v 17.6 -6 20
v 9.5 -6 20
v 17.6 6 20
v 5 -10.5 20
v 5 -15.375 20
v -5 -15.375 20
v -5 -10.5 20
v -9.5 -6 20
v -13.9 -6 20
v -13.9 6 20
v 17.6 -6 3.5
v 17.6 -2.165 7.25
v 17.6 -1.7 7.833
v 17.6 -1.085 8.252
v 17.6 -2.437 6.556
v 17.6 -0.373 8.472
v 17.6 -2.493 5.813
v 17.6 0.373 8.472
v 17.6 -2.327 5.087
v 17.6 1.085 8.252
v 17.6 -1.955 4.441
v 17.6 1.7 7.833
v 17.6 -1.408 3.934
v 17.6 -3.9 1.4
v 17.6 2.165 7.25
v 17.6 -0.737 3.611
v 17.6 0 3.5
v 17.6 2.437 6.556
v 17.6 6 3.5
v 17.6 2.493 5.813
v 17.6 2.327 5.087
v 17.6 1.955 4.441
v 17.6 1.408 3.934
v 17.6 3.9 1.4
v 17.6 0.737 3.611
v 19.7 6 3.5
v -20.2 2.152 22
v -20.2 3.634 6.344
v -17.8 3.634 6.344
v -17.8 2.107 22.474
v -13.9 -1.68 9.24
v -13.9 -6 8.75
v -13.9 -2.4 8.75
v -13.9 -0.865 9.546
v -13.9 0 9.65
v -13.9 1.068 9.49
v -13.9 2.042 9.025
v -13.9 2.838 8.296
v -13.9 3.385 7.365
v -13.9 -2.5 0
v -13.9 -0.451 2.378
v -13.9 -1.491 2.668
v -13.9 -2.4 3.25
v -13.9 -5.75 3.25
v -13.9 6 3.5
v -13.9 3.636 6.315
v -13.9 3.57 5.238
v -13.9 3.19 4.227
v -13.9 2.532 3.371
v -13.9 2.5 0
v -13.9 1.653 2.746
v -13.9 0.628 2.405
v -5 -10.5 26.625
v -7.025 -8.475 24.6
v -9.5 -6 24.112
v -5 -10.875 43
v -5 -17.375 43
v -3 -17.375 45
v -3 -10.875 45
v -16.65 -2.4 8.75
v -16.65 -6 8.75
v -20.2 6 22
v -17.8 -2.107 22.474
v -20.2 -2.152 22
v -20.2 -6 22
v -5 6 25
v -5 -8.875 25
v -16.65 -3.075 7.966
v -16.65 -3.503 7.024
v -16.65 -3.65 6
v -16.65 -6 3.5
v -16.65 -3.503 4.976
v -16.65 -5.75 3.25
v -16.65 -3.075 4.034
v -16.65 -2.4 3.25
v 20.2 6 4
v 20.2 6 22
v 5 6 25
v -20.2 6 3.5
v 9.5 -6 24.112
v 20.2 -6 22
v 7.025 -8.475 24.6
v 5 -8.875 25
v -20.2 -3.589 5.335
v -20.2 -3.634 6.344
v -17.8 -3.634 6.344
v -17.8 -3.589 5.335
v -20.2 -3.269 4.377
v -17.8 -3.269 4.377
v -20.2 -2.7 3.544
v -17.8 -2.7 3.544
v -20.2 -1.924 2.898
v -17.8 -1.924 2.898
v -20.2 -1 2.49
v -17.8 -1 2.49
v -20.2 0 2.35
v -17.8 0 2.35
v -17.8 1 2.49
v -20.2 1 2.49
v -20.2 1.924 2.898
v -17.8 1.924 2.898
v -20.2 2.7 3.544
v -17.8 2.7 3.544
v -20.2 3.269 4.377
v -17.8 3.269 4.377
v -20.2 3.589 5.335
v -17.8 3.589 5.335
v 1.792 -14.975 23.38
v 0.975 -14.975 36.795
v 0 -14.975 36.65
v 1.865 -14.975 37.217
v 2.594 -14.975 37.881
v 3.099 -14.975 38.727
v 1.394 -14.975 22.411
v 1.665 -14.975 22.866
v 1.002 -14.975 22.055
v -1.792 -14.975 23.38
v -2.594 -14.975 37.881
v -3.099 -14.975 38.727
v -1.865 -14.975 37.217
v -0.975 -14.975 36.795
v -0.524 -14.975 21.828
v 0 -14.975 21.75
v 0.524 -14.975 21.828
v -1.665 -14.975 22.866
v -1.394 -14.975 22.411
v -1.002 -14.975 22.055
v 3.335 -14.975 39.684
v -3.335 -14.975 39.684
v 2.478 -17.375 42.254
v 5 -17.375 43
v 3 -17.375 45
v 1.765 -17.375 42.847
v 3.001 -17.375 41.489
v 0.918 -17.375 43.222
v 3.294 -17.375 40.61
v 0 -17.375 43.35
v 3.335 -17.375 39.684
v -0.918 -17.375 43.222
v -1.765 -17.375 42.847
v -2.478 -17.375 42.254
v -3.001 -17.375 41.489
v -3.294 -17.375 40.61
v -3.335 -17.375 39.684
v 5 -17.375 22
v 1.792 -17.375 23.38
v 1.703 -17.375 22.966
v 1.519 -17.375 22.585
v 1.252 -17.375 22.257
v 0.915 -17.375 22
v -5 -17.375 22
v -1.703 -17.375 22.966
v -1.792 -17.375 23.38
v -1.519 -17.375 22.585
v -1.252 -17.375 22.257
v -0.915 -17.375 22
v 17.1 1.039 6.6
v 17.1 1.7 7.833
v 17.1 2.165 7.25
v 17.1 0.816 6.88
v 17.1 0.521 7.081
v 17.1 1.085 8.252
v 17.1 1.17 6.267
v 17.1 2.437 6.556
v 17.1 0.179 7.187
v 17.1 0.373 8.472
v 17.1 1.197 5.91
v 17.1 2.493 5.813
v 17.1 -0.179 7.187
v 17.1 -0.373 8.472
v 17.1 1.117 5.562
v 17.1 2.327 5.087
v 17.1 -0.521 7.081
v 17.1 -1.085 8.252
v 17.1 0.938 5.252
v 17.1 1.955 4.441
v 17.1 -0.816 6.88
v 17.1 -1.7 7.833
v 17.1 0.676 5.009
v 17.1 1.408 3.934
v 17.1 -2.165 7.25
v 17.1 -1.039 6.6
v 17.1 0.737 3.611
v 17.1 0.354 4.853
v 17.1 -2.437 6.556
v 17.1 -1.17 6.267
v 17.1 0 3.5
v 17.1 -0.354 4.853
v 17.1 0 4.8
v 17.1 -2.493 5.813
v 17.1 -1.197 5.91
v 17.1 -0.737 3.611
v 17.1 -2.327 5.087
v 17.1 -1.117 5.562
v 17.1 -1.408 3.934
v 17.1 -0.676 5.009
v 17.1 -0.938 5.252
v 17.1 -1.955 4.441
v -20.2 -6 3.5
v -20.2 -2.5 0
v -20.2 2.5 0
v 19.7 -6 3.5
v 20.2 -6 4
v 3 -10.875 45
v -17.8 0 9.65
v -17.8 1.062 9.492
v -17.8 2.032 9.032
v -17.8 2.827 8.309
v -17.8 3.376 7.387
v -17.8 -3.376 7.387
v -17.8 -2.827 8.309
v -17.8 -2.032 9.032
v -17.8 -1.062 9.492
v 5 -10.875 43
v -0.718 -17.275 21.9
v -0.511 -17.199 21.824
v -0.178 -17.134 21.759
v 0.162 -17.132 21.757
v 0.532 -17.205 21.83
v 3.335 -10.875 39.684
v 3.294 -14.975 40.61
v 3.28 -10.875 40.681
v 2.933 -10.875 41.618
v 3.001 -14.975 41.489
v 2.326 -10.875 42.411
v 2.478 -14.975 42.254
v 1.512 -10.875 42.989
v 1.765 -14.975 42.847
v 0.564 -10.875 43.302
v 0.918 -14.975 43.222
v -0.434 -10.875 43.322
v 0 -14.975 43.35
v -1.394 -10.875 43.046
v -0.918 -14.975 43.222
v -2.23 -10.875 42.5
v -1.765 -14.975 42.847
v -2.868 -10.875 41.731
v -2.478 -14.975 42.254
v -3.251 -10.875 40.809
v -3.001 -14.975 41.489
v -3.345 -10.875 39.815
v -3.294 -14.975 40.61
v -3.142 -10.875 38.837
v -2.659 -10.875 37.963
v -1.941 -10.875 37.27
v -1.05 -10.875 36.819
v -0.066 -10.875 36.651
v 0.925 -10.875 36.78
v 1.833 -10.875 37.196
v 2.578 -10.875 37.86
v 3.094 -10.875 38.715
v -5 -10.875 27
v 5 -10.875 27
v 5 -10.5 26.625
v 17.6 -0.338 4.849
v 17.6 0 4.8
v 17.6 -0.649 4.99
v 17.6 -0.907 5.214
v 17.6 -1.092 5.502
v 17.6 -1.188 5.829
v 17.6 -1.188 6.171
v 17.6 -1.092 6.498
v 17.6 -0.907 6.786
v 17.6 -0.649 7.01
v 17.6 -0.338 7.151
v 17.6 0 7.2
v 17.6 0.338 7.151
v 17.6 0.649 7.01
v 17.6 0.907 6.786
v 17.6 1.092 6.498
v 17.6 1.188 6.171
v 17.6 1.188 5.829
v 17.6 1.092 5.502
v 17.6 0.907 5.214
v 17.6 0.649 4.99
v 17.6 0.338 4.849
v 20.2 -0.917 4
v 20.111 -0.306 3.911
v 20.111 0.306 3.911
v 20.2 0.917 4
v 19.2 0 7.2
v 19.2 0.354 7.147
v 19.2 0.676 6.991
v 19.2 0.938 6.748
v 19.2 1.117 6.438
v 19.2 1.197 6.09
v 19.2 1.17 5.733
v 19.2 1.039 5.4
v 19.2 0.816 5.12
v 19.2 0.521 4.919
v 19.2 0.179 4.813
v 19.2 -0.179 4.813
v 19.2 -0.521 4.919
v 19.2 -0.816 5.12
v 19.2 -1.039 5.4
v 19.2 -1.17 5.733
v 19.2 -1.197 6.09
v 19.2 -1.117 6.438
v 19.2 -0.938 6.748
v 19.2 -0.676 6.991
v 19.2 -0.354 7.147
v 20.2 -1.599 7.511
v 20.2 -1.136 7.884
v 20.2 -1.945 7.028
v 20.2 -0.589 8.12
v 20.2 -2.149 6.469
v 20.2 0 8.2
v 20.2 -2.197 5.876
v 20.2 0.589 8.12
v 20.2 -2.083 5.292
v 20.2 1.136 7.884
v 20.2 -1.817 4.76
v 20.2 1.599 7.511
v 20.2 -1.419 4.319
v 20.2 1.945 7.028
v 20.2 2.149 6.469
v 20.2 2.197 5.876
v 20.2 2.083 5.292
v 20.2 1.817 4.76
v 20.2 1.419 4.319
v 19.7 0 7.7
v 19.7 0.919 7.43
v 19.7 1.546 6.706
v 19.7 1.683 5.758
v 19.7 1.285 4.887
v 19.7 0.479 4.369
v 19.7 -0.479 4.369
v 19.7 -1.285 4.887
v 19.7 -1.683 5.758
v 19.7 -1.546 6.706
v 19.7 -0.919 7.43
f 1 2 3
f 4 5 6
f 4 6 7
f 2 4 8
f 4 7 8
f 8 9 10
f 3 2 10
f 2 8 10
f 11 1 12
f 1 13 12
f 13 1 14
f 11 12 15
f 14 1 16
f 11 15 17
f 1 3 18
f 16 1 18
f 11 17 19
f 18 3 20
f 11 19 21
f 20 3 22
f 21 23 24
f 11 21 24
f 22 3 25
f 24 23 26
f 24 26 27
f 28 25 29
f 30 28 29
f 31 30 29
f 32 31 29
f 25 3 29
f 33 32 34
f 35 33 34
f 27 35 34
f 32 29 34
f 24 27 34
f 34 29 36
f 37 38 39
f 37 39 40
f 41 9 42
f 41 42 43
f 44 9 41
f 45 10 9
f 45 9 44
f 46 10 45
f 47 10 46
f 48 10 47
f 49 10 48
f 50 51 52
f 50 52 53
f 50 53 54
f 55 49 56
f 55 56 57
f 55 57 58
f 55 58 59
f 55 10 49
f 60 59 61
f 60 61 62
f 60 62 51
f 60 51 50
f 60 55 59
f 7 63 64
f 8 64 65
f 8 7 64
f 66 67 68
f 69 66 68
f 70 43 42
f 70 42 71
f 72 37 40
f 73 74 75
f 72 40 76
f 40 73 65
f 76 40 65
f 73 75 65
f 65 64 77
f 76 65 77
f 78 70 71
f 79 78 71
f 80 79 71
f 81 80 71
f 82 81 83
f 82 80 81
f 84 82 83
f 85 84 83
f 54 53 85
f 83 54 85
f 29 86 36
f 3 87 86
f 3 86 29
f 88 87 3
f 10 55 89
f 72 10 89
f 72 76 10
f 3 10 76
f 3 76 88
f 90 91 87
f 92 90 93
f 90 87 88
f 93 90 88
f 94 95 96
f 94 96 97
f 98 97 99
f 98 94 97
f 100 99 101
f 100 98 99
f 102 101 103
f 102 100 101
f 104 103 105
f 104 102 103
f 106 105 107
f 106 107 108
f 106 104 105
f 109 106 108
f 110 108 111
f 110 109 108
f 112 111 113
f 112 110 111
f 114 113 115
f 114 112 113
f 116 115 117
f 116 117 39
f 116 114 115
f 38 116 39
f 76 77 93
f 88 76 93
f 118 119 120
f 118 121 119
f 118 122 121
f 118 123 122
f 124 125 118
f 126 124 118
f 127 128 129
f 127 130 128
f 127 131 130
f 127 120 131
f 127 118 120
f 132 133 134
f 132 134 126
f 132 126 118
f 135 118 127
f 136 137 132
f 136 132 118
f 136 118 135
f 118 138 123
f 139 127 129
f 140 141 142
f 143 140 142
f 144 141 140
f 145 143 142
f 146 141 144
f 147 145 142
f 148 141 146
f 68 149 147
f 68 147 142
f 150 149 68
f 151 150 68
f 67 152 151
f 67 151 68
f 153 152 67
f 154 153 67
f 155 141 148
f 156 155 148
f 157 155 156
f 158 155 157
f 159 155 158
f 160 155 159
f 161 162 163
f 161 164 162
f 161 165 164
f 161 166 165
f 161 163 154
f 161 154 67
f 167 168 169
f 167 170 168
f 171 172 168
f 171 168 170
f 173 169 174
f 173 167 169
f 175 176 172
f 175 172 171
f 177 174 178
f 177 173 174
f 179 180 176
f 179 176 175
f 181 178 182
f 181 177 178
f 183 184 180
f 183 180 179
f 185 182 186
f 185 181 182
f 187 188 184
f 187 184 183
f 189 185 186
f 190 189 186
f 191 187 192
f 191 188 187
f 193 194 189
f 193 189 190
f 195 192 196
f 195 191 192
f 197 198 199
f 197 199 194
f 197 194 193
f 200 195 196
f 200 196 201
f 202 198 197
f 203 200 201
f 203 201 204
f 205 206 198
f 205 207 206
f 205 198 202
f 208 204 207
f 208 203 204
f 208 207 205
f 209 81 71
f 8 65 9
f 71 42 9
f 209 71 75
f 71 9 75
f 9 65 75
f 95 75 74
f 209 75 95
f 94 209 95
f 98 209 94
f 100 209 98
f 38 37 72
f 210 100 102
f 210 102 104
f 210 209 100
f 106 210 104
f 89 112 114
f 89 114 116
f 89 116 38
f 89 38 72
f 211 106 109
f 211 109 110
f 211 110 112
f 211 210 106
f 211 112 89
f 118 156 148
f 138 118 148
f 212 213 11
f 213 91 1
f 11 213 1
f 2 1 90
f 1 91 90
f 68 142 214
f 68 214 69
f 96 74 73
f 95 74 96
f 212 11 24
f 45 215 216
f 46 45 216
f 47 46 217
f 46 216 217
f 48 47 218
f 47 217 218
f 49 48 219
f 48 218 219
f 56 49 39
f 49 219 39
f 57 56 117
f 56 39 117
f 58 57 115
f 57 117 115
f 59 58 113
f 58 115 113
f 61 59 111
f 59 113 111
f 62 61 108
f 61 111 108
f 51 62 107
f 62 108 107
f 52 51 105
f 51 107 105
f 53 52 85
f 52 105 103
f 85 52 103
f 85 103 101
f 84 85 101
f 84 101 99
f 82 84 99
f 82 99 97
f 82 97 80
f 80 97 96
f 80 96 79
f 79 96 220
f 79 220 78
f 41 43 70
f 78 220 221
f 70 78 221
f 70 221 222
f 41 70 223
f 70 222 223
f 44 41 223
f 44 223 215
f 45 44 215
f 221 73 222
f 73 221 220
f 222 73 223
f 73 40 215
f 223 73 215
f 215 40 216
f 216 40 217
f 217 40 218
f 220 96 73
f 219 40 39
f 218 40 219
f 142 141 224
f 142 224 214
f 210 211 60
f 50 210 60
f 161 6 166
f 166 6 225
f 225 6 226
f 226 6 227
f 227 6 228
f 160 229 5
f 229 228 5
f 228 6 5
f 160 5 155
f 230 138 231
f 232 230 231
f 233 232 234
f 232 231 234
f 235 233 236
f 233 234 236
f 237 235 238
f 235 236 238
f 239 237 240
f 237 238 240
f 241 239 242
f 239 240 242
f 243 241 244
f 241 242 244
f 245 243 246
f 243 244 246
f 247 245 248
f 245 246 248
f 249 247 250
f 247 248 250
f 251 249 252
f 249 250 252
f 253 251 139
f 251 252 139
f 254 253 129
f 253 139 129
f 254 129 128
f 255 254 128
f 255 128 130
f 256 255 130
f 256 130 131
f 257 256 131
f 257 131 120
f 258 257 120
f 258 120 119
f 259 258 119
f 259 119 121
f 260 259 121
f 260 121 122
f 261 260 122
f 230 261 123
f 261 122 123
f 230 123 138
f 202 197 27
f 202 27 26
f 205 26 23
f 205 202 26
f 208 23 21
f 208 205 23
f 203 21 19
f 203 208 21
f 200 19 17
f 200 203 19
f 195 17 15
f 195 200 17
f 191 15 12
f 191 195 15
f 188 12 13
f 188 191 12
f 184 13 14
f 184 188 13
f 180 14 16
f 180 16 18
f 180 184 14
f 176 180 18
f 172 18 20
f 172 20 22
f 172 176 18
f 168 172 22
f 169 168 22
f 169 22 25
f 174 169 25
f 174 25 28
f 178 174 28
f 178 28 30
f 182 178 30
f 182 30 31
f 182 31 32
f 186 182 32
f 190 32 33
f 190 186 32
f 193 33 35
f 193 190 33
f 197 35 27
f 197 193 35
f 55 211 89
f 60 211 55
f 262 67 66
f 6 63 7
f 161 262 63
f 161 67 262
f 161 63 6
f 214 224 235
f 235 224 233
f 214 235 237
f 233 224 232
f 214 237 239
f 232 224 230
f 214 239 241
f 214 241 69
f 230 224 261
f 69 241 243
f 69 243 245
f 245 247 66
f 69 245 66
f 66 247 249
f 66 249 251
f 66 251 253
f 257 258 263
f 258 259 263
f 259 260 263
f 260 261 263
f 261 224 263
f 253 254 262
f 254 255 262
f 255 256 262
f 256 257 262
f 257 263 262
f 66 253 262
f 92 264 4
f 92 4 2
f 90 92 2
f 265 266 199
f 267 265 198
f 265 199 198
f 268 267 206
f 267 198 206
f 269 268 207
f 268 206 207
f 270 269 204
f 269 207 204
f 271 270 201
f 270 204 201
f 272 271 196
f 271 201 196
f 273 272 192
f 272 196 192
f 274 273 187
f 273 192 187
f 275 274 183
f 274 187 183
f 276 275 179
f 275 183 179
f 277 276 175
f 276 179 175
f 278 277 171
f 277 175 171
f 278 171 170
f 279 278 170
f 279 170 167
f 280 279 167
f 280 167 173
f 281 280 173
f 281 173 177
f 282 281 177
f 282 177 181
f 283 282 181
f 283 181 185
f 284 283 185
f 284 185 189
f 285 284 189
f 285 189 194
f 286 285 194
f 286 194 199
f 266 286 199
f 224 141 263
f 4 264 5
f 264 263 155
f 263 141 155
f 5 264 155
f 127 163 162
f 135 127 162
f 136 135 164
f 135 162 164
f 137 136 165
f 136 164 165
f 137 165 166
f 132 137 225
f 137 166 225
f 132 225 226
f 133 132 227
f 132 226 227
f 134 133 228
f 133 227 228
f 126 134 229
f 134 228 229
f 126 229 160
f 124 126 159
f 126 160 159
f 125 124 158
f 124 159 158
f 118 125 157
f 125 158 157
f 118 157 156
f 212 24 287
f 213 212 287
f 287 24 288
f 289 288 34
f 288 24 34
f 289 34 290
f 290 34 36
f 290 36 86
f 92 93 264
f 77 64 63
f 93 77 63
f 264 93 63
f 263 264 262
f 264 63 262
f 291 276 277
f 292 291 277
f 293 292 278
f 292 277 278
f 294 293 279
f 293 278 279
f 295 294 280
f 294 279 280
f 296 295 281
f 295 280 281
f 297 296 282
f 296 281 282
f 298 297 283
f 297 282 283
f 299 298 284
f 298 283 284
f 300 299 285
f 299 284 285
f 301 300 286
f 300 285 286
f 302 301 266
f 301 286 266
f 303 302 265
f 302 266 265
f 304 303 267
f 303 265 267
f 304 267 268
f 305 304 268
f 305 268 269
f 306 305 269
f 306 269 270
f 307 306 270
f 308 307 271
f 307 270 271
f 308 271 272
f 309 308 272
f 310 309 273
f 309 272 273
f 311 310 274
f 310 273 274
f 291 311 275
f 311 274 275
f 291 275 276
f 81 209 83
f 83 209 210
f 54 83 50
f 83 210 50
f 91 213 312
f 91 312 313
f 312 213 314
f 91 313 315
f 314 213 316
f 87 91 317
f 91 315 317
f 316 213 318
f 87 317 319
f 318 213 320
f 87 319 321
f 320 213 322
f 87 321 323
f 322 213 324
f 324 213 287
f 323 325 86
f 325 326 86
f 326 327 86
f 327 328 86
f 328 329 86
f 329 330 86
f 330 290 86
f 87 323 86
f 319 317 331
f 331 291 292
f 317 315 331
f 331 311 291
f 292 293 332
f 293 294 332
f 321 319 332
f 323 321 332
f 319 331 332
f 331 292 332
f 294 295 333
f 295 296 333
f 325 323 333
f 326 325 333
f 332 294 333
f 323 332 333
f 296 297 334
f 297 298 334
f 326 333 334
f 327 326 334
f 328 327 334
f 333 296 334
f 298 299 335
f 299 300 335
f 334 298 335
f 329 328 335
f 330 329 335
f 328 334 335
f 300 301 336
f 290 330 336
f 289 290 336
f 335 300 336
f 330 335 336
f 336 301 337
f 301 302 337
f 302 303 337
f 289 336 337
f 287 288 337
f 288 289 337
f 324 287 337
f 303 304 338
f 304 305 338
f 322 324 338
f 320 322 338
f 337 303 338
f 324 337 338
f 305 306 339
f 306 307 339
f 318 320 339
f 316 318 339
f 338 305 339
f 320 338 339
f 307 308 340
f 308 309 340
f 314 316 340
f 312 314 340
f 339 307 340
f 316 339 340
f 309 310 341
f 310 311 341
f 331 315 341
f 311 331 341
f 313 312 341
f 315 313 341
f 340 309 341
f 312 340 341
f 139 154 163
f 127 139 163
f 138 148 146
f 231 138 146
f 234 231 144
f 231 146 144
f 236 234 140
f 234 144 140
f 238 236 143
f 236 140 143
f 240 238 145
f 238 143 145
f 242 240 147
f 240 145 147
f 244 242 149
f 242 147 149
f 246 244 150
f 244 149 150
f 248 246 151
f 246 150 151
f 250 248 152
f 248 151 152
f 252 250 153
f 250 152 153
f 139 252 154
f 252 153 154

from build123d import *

# Parameters (mm, degrees)
SKETCH1_W                                       = 40.4
SKETCH1_H                                       = 12
BOSS_EXTRUDE1_DEPTH                             = 22
CUT_EXTRUDE1_REACH                              = 34.188
SKETCH2_W                                       = 31.5
SKETCH2_H                                       = 20
CUT_EXTRUDE2_REACH                              = 48.391
SKETCH4_R                                       = 0.9
CHAMFER1_SIZE                                   = 3.5
CSK_FOR_M2_FLAT_HEAD_MACHINE_SCREW1_D           = 2.4
CSK_FOR_M2_FLAT_HEAD_MACHINE_SCREW1_DEPTH       = 12.7
CSK_FOR_M2_FLAT_HEAD_MACHINE_SCREW1_CSINK_D     = 4.4
CSK_FOR_M2_FLAT_HEAD_MACHINE_SCREW1_CSINK_ANGLE = 90
CSK_FOR_M2_FLAT_HEAD_MACHINE_SCREW1_TIP         = 0.721032743
CHAMFER2_SIZE                                   = 4
BOSS_EXTRUDE2_START                             = 0.5
SKETCH20_R                                      = 2.5
SKETCH20_R_2                                    = 1.2
BOSS_EXTRUDE2_DEPTH                             = 0.5
BOSS_EXTRUDE3_DEPTH                             = 12
CUT_EXTRUDE3_DEPTH                              = 2.4
SKETCH23_R                                      = 3.65
CUT_EXTRUDE4_DEPTH                              = 22.4
SKETCH24_W                                      = 5.5
SKETCH24_H                                      = 5.5
CUT_EXTRUDE5_DEPTH                              = 22.4
SKETCH26_W                                      = 10
SKETCH26_H                                      = 5
BOSS_EXTRUDE4_DEPTH                             = 11.375
SKETCH27_W                                      = 10
SKETCH27_H                                      = 25
BOSS_EXTRUDE5_DEPTH                             = 6.5
CUT_EXTRUDE6_DEPTH                              = 2.4
SKETCH29_R                                      = 3.35
CUT_EXTRUDE7_DEPTH                              = 54.60028568
CHAMFER3_SIZE                                   = 2
CHAMFER5_SIZE                                   = 2
CHAMFER6_SIZE                                   = 4.5


with BuildPart() as part:
    # Sketch1 → Boss-Extrude1 (new body)
    with BuildSketch(Plane.XY):
        Rectangle(SKETCH1_W, SKETCH1_H)
    extrude(amount=BOSS_EXTRUDE1_DEPTH)

    # Sketch2 → Cut-Extrude1 (cut, up to next)
    with BuildSketch(Plane(origin=(0, 6, 0), x_dir=(1, 0, 0), z_dir=(0, 1, 0)), mode=Mode.PRIVATE) as cut_extrude1_sk1:
        with Locations((1.85, -10)):
            Rectangle(SKETCH2_W, SKETCH2_H)
    cut_extrude1_tool1 = extrude(cut_extrude1_sk1.sketch, amount=-CUT_EXTRUDE1_REACH, mode=Mode.PRIVATE) & part.part
    add(cut_extrude1_tool1.solids().sort_by_distance((1.85, 6, 10))[0], mode=Mode.SUBTRACT)

    # Sketch4 → Cut-Extrude2 (cut, up to next)
    with BuildSketch(Plane(origin=(20.2, 0, 0), x_dir=(0, 0, -1), z_dir=(1, 0, 0)), mode=Mode.PRIVATE) as cut_extrude2_sk1:
        with Locations((-6, 0)):
            Circle(SKETCH4_R)
    cut_extrude2_tool1 = extrude(cut_extrude2_sk1.sketch, amount=-CUT_EXTRUDE2_REACH, mode=Mode.PRIVATE) & part.part
    add(cut_extrude2_tool1.solids().sort_by_distance((20.2, 0, 6))[0], mode=Mode.SUBTRACT)

    # Chamfer1
    chamfer1_edges = [part.edges().sort_by_distance(p)[0] for p in [
        (-17.05, -6, 0),
        (-17.05, 6, 0),
        (18.9, -6, 0),
        (18.9, 6, 0),
    ]]
    chamfer(chamfer1_edges, length=CHAMFER1_SIZE)

    # CSK for M2 Flat Head Machine Screw1
    with Locations(Plane(origin=(20.2, 0, 0), x_dir=(0, 0, -1), z_dir=(1, 0, 0))):
        with Locations((-6, 0)):
            CounterSinkHole(CSK_FOR_M2_FLAT_HEAD_MACHINE_SCREW1_D / 2, CSK_FOR_M2_FLAT_HEAD_MACHINE_SCREW1_CSINK_D / 2, depth=CSK_FOR_M2_FLAT_HEAD_MACHINE_SCREW1_DEPTH, counter_sink_angle=CSK_FOR_M2_FLAT_HEAD_MACHINE_SCREW1_CSINK_ANGLE)
            with Locations((0, 0, -(CSK_FOR_M2_FLAT_HEAD_MACHINE_SCREW1_DEPTH + CSK_FOR_M2_FLAT_HEAD_MACHINE_SCREW1_TIP / 2))):  # 118° drill point
                Cone(0, CSK_FOR_M2_FLAT_HEAD_MACHINE_SCREW1_D / 2, CSK_FOR_M2_FLAT_HEAD_MACHINE_SCREW1_TIP, mode=Mode.SUBTRACT)

    # Chamfer2
    # the kernel refuses this chamfer: 4 mm, written as the material it takes off along each edge
    with BuildSketch(Plane(origin=(20.2, 12.786731952, 0), x_dir=(-0.9996219169112968, 0, -0.027495876610586365), z_dir=(0, -1, 0))) as chamfer2_piece_1:
        Polygon((CHAMFER2_SIZE * 0.999621916911, -CHAMFER2_SIZE * 0.0274958766106), (-CHAMFER2_SIZE * 0.0274958766106, -CHAMFER2_SIZE * 0.999621916911), (0, 0), align=None)
    extrude(amount=25.573463904, mode=Mode.SUBTRACT)

    # Sketch20 → Boss-Extrude2 (add)
    with BuildSketch(Plane.ZY.offset(-17.6).offset(BOSS_EXTRUDE2_START)):
        with Locations(Location((6, 0, 0), (0, 0, 180))):
            Circle(SKETCH20_R)
        with Locations(Location((6, 0, 0), (0, 0, 180))):
            Circle(SKETCH20_R_2, mode=Mode.SUBTRACT)
    extrude(amount=-BOSS_EXTRUDE2_DEPTH)

    # Sketch25 → Boss-Extrude3 (add, through all)
    with BuildSketch(Plane.XZ.offset(6)):
        Polygon((20.2, 22), (-20.2, 22), (-5, 25), (5, 25), align=None)
    extrude(amount=-BOSS_EXTRUDE3_DEPTH)

    # Sketch5 → Cut-Extrude3 (cut)
    with BuildSketch(Plane.ZY.offset(20.2)):
        with BuildLine():
            Line((6.343920973, 3.633760912), (22.64787234, 2.090656963))
            ThreePointArc((22.64787234, 2.090656963), (24.55, 0), (22.64787234, -2.090656963))
            Line((22.64787234, -2.090656963), (6.343920973, -3.633760912))
            ThreePointArc((6.343920973, -3.633760912), (2.35, 0), (6.343920973, 3.633760912))
        make_face()
    extrude(amount=-CUT_EXTRUDE3_DEPTH, mode=Mode.SUBTRACT)

    # Sketch23 → Cut-Extrude4 (cut)
    with BuildSketch(Plane.ZY.offset(17.8)):
        with Locations((6, 0)):
            Circle(SKETCH23_R)
    extrude(amount=-CUT_EXTRUDE4_DEPTH, mode=Mode.SUBTRACT)

    # Sketch24 → Cut-Extrude5 (cut)
    with BuildSketch(Plane(origin=(0, 0, 0), x_dir=(-1, 0, 0), z_dir=(0, -1, 0))):
        with Locations((13.9, -6)):
            Rectangle(SKETCH24_W, SKETCH24_H)
    extrude(amount=CUT_EXTRUDE5_DEPTH, mode=Mode.SUBTRACT)

    # Sketch26 → Boss-Extrude4 (add)
    with BuildSketch(Plane(origin=(0, -6, 0), x_dir=(1, 0, 0), z_dir=(0, 1, 0))):
        with Locations((0, -22.5)):
            Rectangle(SKETCH26_W, SKETCH26_H)
    extrude(amount=-BOSS_EXTRUDE4_DEPTH)

    # Sketch27 → Boss-Extrude5 (add)
    with BuildSketch(Plane(origin=(0, -17.375, 0), x_dir=(-1, 0, 0), z_dir=(0, -1, 0))):
        with Locations((0, -32.5)):
            Rectangle(SKETCH27_W, SKETCH27_H)
    extrude(amount=-BOSS_EXTRUDE5_DEPTH)

    # Sketch28 → Cut-Extrude6 (cut)
    with BuildSketch(Plane(origin=(0, -17.375, 0), x_dir=(-1, 0, 0), z_dir=(0, -1, 0))):
        with BuildLine():
            Line((-1.791991683, -23.380395137), (-3.335095631, -39.684346505))
            ThreePointArc((-3.335095631, -39.684346505), (0, -43.35), (3.335095631, -39.684346505))
            Line((3.335095631, -39.684346505), (1.791991683, -23.380395137))
            ThreePointArc((1.791991683, -23.380395137), (0, -21.75), (-1.791991683, -23.380395137))
        make_face()
    extrude(amount=-CUT_EXTRUDE6_DEPTH, mode=Mode.SUBTRACT)

    # Sketch29 → Cut-Extrude7 (cut, through all)
    with BuildSketch(Plane(origin=(0, -14.975, 0), x_dir=(-1, 0, 0), z_dir=(0, -1, 0))):
        with Locations(Location((0, -40, 0), (0, 0, 174.593288878))):
            Circle(SKETCH29_R)
    extrude(amount=-CUT_EXTRUDE7_DEPTH, mode=Mode.SUBTRACT)

    # Chamfer3
    # the kernel refuses this chamfer: 2 mm, written as the material it takes off along each edge
    with BuildSketch(Plane(origin=(10.143365976, -17.375, 20), x_dir=(0, 0.9996219169112968, -0.0274958766105856), z_dir=(-1, 0, 0))) as chamfer3_piece_1:
        Polygon((CHAMFER3_SIZE * 0.999621916911, -CHAMFER3_SIZE * 0.0274958766106), (-CHAMFER3_SIZE * 0.0274958766106, -CHAMFER3_SIZE * 0.999621916911), (0, 0), align=None)
    extrude(amount=20.286731952, mode=Mode.SUBTRACT)
    with BuildSketch(Plane(origin=(-5, -22.518365976, 45), x_dir=(-0.02749587661058651, 0, -0.9996219169112968), z_dir=(0, 1, 0))) as chamfer3_piece_2:
        Polygon((CHAMFER3_SIZE * 0.999621916911, -CHAMFER3_SIZE * 0.0274958766106), (-CHAMFER3_SIZE * 0.0274958766106, -CHAMFER3_SIZE * 0.999621916911), (0, 0), align=None)
    extrude(amount=16.786731952, mode=Mode.SUBTRACT)
    with BuildSketch(Plane(origin=(5, -22.518365976, 45), x_dir=(0.02749587661058651, 0, -0.9996219169112968), z_dir=(0, 1, 0))) as chamfer3_piece_3:
        Polygon((CHAMFER3_SIZE * 0.999621916911, CHAMFER3_SIZE * 0.0274958766106), (-CHAMFER3_SIZE * 0.0274958766106, CHAMFER3_SIZE * 0.999621916911), (0, 0), align=None)
    extrude(amount=16.786731952, mode=Mode.SUBTRACT)

    # Chamfer5
    chamfer5_edges = [part.edges().sort_by_distance(p)[0] for p in [
        (0, -10.875, 25),
    ]]
    chamfer(chamfer5_edges, length=CHAMFER5_SIZE)

    # Chamfer6
    # the kernel refuses this chamfer: 4.5 mm, written as the material it adds along each edge
    with BuildSketch(Plane(origin=(-5, -6, 20), x_dir=(0.027495876610586587, -0.9996219169112966, 0), z_dir=(0, 0, 1))) as chamfer6_piece_1_section:
        Polygon((CHAMFER6_SIZE * 0.999621916911, -CHAMFER6_SIZE * 0.0274958766106), (-CHAMFER6_SIZE * 0.0274958766106, -CHAMFER6_SIZE * 0.999621916911), (0, 0), align=None)
    chamfer6_piece_1 = extrude(amount=16.572573446, mode=Mode.PRIVATE)
    chamfer6_piece_1 = split(chamfer6_piece_1, bisect_by=Plane(origin=(-6.365694547, -6.762864523, 22.887864523), z_dir=(0, -0.7071067811865476, -0.7071067811865476)), keep=Keep.TOP, mode=Mode.PRIVATE)
    add(chamfer6_piece_1)
    with BuildSketch(Plane(origin=(-5, -6, 20), x_dir=(0.027495876610586587, -0.9996219169112966, 0), z_dir=(0, 0, 1))) as chamfer6_piece_2_section:
        Polygon((CHAMFER6_SIZE * 0.999621916911, -CHAMFER6_SIZE * 0.0274958766106), (-CHAMFER6_SIZE * 0.0274958766106, -CHAMFER6_SIZE * 0.999621916911), (0, 0), align=None)
    chamfer6_piece_2 = extrude(amount=16.572573446, mode=Mode.PRIVATE)
    chamfer6_piece_2 = split(chamfer6_piece_2, bisect_by=Plane(origin=(-6.882801267, -6.788517358, 24.628394487), z_dir=(0.19363303189666034, 0, -0.9810740282764124)), keep=Keep.TOP, mode=Mode.PRIVATE)
    add(chamfer6_piece_2)
    with BuildSketch(Plane(origin=(5, -6, 36.572573446), x_dir=(-0.0274958766105862, -0.9996219169112969, 0), z_dir=(0, 0, -1))) as chamfer6_piece_3_section:
        Polygon((CHAMFER6_SIZE * 0.999621916911, -CHAMFER6_SIZE * 0.0274958766106), (-CHAMFER6_SIZE * 0.0274958766106, -CHAMFER6_SIZE * 0.999621916911), (0, 0), align=None)
    chamfer6_piece_3 = extrude(amount=16.572573446, mode=Mode.PRIVATE)
    chamfer6_piece_3 = split(chamfer6_piece_3, bisect_by=Plane(origin=(5.40625, -9.484375, 25.609375), z_dir=(0, -0.7071067811865476, -0.7071067811865476)), keep=Keep.TOP, mode=Mode.PRIVATE)
    add(chamfer6_piece_3)
    with BuildSketch(Plane(origin=(5, -6, 36.572573446), x_dir=(-0.0274958766105862, -0.9996219169112969, 0), z_dir=(0, 0, -1))) as chamfer6_piece_4_section:
        Polygon((CHAMFER6_SIZE * 0.999621916911, -CHAMFER6_SIZE * 0.0274958766106), (-CHAMFER6_SIZE * 0.0274958766106, -CHAMFER6_SIZE * 0.999621916911), (0, 0), align=None)
    chamfer6_piece_4 = extrude(amount=16.572573446, mode=Mode.PRIVATE)
    chamfer6_piece_4 = split(chamfer6_piece_4, bisect_by=Plane(origin=(6.882801267, -6.788517358, 24.628394487), z_dir=(-0.19363303189666034, 0, -0.9810740282764124)), keep=Keep.TOP, mode=Mode.PRIVATE)
    add(chamfer6_piece_4)


solid = part.part
